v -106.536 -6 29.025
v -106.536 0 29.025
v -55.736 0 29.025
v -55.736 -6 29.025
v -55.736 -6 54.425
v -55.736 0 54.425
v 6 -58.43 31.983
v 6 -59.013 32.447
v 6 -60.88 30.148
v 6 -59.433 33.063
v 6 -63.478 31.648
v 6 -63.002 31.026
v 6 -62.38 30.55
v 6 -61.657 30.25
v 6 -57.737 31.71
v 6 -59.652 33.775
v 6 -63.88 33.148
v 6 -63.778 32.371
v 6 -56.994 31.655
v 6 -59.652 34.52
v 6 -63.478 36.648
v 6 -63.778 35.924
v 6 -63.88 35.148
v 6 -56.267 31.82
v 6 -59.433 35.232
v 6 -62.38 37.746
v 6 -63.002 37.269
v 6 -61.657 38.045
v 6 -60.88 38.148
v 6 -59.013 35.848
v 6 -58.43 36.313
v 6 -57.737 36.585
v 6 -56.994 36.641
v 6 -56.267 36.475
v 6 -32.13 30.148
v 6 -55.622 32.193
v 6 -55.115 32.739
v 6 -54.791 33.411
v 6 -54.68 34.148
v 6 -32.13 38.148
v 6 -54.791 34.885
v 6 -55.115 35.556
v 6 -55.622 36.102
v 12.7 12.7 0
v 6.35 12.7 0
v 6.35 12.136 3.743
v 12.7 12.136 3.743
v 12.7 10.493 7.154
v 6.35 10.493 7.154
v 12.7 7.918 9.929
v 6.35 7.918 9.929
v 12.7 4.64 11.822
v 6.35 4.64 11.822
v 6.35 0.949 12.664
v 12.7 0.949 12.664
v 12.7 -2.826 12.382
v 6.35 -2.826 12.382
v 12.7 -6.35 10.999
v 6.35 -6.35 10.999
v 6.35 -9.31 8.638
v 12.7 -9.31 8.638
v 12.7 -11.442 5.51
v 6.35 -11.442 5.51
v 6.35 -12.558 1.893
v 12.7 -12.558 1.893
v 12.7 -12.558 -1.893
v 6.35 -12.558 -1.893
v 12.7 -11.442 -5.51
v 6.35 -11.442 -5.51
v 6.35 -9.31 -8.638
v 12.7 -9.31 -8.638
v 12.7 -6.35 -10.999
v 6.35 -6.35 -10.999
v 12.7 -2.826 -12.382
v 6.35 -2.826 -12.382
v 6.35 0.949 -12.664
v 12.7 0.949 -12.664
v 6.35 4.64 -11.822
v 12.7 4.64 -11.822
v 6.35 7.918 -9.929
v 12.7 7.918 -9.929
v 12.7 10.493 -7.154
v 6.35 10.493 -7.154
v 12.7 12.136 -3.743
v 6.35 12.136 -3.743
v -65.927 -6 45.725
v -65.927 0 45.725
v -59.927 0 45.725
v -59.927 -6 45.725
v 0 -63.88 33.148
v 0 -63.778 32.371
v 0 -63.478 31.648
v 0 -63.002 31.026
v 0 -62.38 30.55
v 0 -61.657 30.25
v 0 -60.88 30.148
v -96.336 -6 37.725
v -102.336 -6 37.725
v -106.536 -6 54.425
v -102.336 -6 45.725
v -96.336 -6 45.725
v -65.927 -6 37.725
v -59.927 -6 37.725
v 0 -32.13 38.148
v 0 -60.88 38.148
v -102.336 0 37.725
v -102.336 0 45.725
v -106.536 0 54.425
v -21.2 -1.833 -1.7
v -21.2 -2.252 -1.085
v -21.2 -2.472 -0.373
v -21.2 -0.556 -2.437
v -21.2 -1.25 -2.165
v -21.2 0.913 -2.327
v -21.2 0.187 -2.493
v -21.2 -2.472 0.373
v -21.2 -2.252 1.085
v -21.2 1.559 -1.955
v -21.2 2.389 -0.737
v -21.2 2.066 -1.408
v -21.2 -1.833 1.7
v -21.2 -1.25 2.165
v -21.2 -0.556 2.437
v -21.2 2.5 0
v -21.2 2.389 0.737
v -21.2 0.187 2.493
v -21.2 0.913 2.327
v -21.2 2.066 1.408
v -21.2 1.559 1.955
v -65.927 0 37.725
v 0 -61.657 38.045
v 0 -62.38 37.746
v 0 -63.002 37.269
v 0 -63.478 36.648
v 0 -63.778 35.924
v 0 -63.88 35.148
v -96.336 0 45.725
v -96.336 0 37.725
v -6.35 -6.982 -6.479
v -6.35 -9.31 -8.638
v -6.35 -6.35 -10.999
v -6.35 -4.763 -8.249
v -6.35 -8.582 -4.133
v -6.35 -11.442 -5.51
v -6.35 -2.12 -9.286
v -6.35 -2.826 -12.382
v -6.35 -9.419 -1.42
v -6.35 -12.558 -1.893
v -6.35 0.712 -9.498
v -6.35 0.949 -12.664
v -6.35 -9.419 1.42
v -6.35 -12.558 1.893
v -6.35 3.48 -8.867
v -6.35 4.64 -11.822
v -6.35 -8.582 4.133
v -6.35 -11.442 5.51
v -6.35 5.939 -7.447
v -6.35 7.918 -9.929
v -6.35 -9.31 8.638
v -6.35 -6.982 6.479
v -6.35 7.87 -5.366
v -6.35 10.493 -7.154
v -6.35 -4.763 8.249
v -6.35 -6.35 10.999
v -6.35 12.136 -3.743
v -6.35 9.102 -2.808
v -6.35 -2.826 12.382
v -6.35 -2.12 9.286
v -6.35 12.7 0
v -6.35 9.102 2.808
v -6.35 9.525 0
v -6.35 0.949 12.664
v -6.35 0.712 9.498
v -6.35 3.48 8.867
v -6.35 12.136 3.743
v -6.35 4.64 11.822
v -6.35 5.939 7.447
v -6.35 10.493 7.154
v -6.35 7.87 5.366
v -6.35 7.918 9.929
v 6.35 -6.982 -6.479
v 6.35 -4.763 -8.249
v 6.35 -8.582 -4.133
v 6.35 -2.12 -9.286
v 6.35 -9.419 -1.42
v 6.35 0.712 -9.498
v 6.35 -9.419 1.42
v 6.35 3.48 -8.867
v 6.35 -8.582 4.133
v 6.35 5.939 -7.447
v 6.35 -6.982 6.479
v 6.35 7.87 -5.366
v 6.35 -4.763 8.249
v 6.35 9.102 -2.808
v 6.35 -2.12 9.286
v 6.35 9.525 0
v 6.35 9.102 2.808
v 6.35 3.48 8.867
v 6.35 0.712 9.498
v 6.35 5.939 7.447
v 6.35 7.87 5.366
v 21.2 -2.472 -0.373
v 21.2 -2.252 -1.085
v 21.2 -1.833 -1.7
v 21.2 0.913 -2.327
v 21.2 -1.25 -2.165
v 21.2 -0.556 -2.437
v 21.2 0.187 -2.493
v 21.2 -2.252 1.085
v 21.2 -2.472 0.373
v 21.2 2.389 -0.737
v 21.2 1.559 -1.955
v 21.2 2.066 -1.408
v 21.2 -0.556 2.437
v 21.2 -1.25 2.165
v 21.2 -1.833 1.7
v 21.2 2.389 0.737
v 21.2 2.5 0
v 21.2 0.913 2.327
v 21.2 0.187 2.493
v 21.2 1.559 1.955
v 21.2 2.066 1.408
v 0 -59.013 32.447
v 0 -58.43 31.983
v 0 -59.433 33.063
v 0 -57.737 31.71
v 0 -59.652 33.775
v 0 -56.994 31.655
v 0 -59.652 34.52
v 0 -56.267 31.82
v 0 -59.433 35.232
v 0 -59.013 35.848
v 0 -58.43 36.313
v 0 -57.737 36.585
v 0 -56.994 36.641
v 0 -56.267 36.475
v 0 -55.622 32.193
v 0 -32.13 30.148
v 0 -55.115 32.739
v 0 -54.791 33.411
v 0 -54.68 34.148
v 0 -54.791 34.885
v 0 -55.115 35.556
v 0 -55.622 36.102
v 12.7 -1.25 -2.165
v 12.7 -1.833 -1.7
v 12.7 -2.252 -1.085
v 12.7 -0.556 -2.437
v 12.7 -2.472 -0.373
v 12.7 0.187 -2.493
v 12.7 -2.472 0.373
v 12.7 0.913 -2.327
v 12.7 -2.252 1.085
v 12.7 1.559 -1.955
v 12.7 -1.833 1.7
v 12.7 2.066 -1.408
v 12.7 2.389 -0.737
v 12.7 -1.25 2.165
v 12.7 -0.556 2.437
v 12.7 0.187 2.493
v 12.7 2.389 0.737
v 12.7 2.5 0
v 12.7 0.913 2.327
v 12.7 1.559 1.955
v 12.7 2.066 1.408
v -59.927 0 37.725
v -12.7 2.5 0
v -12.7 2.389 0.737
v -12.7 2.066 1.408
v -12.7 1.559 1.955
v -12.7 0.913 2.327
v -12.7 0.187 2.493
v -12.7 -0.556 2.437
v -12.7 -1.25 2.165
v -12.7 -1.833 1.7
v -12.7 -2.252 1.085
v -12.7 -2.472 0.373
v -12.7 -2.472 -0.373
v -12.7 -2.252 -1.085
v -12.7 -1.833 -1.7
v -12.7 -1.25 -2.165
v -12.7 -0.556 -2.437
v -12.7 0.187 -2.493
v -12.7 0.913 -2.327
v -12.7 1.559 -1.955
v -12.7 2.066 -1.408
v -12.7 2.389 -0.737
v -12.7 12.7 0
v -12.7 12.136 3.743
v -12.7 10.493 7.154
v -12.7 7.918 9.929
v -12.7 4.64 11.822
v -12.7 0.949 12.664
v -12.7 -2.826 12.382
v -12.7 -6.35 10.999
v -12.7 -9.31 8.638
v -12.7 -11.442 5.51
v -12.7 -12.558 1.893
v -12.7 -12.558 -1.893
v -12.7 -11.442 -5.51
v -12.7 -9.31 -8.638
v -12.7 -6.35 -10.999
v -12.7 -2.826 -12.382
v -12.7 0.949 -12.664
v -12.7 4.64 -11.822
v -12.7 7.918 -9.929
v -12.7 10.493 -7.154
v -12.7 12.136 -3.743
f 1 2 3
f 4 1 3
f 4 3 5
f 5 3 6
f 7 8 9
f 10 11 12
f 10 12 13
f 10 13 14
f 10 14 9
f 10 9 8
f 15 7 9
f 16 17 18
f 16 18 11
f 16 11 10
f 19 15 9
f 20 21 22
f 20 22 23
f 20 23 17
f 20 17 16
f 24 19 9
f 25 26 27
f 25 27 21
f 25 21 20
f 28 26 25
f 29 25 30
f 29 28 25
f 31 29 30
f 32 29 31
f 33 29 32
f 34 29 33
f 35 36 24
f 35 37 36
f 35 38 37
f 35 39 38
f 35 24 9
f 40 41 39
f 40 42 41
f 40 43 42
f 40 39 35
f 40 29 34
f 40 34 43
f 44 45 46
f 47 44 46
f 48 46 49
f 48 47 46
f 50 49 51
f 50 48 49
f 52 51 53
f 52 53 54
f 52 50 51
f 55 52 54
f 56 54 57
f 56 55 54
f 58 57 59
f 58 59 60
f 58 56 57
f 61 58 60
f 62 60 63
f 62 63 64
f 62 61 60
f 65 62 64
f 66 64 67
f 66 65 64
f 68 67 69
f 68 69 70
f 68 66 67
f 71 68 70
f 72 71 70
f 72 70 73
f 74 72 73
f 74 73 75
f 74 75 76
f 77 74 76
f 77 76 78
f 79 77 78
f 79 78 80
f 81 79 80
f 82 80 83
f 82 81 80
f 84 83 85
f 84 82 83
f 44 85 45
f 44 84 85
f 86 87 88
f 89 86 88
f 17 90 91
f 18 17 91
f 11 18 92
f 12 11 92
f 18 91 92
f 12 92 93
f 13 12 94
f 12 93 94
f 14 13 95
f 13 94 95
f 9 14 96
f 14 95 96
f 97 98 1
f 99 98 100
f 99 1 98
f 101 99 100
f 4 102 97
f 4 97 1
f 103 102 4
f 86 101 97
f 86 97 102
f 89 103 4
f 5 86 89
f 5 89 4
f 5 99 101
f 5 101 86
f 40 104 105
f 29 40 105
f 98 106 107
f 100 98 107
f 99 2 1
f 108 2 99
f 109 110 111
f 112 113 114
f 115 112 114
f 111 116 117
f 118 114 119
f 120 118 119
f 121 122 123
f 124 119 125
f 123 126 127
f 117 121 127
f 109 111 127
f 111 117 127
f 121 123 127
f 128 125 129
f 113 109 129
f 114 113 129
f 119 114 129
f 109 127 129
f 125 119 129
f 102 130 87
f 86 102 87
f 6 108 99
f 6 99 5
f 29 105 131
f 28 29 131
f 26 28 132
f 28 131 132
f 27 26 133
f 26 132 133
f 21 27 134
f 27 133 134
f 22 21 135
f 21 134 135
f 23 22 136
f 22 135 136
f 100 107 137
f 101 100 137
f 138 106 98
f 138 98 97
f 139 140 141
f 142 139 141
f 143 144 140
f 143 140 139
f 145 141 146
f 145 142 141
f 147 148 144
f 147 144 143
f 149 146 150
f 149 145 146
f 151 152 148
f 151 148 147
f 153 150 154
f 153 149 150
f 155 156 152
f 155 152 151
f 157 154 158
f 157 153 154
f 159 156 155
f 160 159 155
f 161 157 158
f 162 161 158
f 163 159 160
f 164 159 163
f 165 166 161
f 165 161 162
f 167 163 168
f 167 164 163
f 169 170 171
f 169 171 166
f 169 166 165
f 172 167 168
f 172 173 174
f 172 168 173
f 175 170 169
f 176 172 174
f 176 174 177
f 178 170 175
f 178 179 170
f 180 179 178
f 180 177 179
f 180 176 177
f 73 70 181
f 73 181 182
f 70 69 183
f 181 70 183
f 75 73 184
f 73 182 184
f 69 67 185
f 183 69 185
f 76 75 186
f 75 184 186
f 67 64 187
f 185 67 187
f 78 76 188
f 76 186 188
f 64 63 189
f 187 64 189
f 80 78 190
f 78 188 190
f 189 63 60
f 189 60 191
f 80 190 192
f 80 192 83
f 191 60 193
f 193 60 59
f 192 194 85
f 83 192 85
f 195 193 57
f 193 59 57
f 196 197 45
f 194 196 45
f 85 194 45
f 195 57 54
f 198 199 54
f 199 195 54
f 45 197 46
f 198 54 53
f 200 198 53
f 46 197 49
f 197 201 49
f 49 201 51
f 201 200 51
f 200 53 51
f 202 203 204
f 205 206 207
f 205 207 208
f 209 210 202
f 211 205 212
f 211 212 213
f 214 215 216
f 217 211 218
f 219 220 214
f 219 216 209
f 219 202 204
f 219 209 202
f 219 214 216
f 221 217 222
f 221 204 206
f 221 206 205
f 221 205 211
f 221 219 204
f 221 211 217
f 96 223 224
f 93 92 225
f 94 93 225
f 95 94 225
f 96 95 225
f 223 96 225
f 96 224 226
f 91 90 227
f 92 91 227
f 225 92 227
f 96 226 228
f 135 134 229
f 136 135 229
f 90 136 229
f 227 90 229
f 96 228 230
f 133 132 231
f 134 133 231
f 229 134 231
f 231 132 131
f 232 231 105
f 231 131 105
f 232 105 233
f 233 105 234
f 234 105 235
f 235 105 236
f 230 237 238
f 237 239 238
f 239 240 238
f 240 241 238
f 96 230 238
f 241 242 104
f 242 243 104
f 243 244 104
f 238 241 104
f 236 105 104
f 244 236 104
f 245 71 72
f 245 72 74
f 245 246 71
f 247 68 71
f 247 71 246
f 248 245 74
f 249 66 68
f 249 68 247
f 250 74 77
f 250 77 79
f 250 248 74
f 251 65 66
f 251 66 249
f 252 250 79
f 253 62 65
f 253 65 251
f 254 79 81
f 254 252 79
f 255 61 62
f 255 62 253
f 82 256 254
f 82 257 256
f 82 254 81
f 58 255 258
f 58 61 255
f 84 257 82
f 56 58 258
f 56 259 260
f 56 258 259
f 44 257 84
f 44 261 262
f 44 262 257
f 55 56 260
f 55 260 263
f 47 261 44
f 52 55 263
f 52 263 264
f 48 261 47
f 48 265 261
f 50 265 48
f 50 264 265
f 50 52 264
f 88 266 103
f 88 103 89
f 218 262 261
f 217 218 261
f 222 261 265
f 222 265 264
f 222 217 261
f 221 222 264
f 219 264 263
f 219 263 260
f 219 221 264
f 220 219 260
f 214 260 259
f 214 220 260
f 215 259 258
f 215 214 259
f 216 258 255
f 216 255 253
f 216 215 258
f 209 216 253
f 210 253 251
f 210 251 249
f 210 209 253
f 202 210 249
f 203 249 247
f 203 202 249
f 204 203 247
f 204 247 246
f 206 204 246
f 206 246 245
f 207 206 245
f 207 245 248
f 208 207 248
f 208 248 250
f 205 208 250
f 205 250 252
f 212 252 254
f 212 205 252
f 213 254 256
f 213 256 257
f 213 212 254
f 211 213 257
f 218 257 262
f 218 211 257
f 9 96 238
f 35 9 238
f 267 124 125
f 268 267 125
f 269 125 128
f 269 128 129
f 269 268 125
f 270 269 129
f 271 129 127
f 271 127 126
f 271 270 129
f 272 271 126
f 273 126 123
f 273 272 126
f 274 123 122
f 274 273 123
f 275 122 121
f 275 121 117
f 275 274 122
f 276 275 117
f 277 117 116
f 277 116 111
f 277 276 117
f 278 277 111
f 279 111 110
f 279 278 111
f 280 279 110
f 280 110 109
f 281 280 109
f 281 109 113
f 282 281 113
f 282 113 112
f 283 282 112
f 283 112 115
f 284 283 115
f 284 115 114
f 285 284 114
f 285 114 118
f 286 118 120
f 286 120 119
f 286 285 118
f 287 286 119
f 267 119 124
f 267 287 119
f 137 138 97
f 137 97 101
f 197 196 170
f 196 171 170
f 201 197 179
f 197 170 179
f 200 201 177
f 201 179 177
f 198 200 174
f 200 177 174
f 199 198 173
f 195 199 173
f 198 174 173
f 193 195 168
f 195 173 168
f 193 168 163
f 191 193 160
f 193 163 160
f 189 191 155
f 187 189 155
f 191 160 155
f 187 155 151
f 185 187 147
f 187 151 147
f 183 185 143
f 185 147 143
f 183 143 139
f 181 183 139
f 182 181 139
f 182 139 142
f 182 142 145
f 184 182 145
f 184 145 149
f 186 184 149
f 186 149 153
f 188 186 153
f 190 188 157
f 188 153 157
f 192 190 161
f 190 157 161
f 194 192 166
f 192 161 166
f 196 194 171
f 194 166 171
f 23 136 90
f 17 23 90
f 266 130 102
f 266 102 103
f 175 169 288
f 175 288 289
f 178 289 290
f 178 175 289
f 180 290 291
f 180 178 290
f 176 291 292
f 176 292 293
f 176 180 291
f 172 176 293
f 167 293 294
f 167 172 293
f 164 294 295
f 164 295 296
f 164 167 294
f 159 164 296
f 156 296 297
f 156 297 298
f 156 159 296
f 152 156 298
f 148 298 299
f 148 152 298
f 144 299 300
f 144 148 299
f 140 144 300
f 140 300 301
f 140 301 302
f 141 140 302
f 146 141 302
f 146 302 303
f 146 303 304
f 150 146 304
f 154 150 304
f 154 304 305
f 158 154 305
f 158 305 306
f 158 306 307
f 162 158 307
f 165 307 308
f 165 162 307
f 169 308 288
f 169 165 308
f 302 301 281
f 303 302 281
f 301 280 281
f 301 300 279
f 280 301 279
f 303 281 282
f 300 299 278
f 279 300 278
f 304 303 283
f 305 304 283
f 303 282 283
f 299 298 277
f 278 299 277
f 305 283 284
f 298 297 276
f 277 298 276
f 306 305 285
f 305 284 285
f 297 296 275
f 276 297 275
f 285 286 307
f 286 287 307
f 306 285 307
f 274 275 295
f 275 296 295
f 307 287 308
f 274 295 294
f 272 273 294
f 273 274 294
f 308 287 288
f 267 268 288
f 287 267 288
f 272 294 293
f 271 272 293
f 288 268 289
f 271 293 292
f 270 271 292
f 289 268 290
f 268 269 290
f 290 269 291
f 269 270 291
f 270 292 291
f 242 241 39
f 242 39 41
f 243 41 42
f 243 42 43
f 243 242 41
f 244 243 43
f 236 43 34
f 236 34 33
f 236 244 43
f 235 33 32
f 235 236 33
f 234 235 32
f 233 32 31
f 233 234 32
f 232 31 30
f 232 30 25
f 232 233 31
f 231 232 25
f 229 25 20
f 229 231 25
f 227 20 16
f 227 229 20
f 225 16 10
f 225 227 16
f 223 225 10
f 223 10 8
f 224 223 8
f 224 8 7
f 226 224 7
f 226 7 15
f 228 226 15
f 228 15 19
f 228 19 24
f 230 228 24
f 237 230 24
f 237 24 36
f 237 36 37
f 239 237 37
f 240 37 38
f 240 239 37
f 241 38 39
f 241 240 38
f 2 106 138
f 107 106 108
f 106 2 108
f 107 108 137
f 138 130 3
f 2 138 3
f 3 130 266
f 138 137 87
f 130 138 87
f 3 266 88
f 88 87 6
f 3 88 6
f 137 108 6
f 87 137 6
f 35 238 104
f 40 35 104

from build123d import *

# Parameters (mm, degrees)
F0_R     = 2.5
F1_DEPTH = 21.2
F0_R_2   = 12.7
F0_R_3   = 9.525
F2_DEPTH = 12.7
F3_DEPTH = 6.35
F4_R     = 2.5
F5_DEPTH = 6
F6_W     = 50.8
F6_H     = 25.4
F6_W_2   = 6
F6_H_2   = 8
F7_DEPTH = 6


with BuildPart() as f1:
    # F0 (on Right) → F1 (new body, symmetric)
    with BuildSketch(Plane.YZ):
        Circle(F0_R)
    extrude(amount=F1_DEPTH, both=True)

    # F0 (on Right) → F2 (join, symmetric)
    with BuildSketch(Plane.YZ):
        Circle(F0_R_2)
        Circle(F0_R_3, mode=Mode.SUBTRACT)
        Circle(F0_R_3)
        Circle(F0_R, mode=Mode.SUBTRACT)
    extrude(amount=F2_DEPTH, both=True)

    # F0 (on Right) → F3 (cut, symmetric)
    with BuildSketch(Plane.YZ):
        Circle(F0_R_2)
        Circle(F0_R_3, mode=Mode.SUBTRACT)
    extrude(amount=F3_DEPTH, both=True, mode=Mode.SUBTRACT)


with BuildPart() as f5:
    # F4 (on Right) → F5 (new body)
    with BuildSketch(Plane.YZ):
        with BuildLine():
            Line((-60.880328, 30.147629), (-32.130328, 30.147629))
            Line((-32.130328, 30.147629), (-32.130328, 38.147629))
            Line((-32.130328, 38.147629), (-60.880328, 38.147629))
            ThreePointArc((-60.880328, 38.147629), (-63.001648, 37.26895), (-63.880328, 35.147629))
            Line((-63.880328, 35.147629), (-63.880328, 33.147629))
            ThreePointArc((-63.880328, 33.147629), (-63.001648, 31.026309), (-60.880328, 30.147629))
        make_face()
        with Locations((-57.180328, 34.147629)):
            Circle(F4_R, mode=Mode.SUBTRACT)
    extrude(amount=F5_DEPTH)


with BuildPart() as f7:
    # F6 (on Front) → F7 (new body)
    with BuildSketch(Plane.XZ):
        with Locations((-81.135715, 41.724754)):
            Rectangle(F6_W, F6_H)
        with Locations((-99.335715, 41.724754)):
            Rectangle(F6_W_2, F6_H_2, mode=Mode.SUBTRACT)
        with Locations((-62.926715, 41.724754)):
            Rectangle(F6_W_2, F6_H_2, mode=Mode.SUBTRACT)
    extrude(amount=F7_DEPTH)


solid = Compound([f1.part, f5.part, f7.part])
